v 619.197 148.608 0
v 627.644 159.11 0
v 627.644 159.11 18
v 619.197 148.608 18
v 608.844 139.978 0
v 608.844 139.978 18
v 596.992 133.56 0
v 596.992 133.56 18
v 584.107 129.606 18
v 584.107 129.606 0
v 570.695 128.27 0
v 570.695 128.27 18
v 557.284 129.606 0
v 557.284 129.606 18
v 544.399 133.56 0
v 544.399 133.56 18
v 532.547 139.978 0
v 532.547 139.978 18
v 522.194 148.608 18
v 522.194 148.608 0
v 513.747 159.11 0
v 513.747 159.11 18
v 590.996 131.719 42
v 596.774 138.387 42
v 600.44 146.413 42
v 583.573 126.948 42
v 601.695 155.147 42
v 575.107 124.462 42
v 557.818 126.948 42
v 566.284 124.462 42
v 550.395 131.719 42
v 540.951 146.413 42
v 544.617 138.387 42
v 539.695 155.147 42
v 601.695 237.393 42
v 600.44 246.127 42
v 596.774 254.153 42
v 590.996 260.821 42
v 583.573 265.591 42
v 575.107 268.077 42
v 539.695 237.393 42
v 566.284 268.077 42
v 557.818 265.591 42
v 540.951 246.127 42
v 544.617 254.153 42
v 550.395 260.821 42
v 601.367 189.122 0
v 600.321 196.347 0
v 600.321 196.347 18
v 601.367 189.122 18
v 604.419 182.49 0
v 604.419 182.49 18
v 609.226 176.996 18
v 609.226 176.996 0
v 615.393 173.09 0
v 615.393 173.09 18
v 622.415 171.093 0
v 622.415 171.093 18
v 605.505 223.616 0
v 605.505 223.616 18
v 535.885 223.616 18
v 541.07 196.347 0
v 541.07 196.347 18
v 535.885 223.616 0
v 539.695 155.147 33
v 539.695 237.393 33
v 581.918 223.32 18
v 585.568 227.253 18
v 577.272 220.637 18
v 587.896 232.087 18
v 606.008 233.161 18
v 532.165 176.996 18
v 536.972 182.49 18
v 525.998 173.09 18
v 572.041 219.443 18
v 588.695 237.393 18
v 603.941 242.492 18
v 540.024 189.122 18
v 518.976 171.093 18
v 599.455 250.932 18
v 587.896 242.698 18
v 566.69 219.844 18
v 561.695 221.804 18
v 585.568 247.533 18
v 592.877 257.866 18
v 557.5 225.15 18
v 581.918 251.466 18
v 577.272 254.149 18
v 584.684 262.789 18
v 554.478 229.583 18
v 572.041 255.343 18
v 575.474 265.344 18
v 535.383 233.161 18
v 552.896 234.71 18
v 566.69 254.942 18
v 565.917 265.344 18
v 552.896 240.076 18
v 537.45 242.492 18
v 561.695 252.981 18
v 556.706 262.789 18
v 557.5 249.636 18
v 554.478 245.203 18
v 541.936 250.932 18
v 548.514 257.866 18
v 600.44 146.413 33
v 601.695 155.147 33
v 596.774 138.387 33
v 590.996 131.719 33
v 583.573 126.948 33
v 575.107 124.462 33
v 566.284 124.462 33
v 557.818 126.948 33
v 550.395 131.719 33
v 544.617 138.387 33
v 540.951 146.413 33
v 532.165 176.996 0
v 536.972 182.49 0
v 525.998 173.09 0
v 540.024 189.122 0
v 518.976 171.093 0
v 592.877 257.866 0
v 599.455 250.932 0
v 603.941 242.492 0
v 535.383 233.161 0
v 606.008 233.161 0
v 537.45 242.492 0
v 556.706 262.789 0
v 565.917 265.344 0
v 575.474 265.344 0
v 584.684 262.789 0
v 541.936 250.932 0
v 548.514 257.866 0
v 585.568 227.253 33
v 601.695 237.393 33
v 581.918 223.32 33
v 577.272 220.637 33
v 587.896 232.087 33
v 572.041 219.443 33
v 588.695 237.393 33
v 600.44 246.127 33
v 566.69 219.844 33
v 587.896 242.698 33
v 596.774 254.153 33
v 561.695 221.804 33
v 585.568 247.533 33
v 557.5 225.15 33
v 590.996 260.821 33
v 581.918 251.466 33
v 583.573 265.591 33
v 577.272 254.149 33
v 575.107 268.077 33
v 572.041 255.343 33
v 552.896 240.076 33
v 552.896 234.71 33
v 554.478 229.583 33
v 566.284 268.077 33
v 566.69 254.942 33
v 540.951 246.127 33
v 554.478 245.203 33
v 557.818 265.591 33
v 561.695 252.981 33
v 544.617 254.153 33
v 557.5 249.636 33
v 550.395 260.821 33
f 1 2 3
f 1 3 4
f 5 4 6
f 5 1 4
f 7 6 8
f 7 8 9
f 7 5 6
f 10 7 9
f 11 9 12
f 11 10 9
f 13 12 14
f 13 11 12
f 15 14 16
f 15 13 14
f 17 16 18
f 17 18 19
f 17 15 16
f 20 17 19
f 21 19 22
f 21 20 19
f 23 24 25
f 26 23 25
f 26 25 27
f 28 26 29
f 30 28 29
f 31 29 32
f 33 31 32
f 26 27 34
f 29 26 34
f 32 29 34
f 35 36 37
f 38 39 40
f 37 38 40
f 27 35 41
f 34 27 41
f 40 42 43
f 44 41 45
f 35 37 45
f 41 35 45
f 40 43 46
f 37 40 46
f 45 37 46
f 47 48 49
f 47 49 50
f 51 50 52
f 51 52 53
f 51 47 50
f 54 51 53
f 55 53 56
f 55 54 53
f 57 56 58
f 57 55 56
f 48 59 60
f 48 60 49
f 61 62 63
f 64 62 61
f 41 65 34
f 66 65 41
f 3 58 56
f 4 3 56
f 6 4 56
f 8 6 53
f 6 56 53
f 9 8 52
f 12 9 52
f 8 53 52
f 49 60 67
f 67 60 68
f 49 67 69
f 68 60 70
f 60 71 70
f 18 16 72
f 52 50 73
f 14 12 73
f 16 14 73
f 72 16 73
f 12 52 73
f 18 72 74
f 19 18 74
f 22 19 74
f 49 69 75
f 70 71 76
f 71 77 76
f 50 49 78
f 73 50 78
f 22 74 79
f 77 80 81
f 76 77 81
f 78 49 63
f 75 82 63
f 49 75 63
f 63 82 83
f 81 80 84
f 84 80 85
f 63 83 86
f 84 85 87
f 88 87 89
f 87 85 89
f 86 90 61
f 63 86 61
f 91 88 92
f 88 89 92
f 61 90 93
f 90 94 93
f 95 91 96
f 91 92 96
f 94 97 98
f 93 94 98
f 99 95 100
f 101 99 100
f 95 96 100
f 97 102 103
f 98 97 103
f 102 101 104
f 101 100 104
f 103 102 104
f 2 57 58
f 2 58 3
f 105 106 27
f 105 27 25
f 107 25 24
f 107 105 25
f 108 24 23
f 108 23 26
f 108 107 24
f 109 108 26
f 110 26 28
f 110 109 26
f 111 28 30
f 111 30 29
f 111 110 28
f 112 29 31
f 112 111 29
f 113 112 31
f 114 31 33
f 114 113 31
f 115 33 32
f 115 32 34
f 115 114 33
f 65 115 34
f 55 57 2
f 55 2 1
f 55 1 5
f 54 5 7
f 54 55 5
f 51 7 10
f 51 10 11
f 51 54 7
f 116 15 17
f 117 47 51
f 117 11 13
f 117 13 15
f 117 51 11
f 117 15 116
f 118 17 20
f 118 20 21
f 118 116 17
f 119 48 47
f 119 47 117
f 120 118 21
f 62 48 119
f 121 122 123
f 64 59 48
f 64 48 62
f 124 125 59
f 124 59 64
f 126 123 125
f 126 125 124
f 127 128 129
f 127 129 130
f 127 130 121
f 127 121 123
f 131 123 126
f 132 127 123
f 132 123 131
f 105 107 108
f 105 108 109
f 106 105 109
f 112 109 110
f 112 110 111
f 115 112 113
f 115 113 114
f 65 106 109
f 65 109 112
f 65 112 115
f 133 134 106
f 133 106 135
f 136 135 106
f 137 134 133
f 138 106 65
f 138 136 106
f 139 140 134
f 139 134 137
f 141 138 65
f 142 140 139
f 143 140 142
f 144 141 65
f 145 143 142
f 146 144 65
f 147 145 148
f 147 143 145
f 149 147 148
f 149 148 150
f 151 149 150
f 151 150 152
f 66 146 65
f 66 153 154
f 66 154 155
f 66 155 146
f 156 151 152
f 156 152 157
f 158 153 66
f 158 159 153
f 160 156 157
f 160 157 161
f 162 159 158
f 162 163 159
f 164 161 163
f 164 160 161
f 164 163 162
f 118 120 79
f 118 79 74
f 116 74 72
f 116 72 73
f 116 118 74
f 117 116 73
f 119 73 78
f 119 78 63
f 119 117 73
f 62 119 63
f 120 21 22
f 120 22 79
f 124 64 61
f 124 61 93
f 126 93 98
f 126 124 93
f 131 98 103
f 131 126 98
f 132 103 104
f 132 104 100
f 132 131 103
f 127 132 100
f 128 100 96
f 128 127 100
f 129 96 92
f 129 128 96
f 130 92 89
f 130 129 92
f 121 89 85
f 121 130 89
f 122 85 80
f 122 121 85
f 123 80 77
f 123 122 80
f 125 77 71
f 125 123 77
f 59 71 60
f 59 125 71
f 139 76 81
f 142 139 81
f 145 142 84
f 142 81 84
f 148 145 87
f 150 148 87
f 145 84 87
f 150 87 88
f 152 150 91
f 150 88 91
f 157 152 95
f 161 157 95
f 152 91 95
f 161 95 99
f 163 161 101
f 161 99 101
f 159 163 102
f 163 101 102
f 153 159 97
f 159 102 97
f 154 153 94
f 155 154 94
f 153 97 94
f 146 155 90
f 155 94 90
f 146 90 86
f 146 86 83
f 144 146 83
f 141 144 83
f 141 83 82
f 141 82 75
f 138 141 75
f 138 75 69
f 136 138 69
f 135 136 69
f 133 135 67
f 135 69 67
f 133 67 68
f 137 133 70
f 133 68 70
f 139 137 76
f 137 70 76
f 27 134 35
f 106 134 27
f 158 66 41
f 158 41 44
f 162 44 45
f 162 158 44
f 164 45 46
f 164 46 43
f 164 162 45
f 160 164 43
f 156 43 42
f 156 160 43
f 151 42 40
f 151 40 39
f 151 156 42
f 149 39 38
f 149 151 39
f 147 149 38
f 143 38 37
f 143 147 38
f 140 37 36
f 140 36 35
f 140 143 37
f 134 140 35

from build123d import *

# Parameters (mm, degrees)
EXTRUDE_1_DEPTH = 18
SKETCH_2_R      = 18
EXTRUDE_2_DEPTH = 15
EXTRUDE_3_DEPTH = 9


with BuildPart() as part:
    # Эскиз1 → Бобышка-Вытянуть1 (new body)
    with BuildSketch(Plane.XY):
        with BuildLine():
            Line((513.746536265, 159.110381716), (518.975806012, 171.093022728))
            ThreePointArc((518.975806012, 171.093022728), (534.766582533, 179.569802198), (541.069644925, 196.347043265))
            Line((541.069644925, 196.347043265), (535.885484235, 223.616162023))
            ThreePointArc((535.885484235, 223.616162023), (570.695429585, 265.667333265), (605.505374934, 223.616162023))
            Line((605.505374934, 223.616162023), (600.321214244, 196.347043265))
            ThreePointArc((600.321214244, 196.347043265), (606.624276637, 179.569802198), (622.415053158, 171.093022728))
            Line((622.415053158, 171.093022728), (627.644322904, 159.110381716))
            ThreePointArc((627.644322904, 159.110381716), (570.695429585, 128.269815911), (513.746536265, 159.110381716))
        make_face()
    extrude(amount=EXTRUDE_1_DEPTH)


with BuildPart() as body_2:
    # Эскиз2 → Бобышка-Вытянуть2 (new body)
    with BuildSketch(Plane.XY.offset(18)):
        with Locations((570.695429585, 237.392875312)):
            Circle(SKETCH_2_R)
    extrude(amount=EXTRUDE_2_DEPTH)


with BuildPart() as body_3:
    # Эскиз4 → Бобышка-Вытянуть3 (new body)
    with BuildSketch(Plane.XY.offset(33)):
        with BuildLine():
            Line((539.695429585, 155.14675651), (539.695429585, 237.392875312))
            ThreePointArc((539.695429585, 237.392875312), (570.695429585, 268.392875312), (601.695429585, 237.392875312))
            Line((601.695429585, 237.392875312), (601.695429585, 155.14675651))
            ThreePointArc((601.695429585, 155.14675651), (570.695429585, 124.14675651), (539.695429585, 155.14675651))
        make_face()
    extrude(amount=EXTRUDE_3_DEPTH)

    # Combine 3: union part, body 2
    add(part.part)
    add(body_2.part)


solid = body_3.part
